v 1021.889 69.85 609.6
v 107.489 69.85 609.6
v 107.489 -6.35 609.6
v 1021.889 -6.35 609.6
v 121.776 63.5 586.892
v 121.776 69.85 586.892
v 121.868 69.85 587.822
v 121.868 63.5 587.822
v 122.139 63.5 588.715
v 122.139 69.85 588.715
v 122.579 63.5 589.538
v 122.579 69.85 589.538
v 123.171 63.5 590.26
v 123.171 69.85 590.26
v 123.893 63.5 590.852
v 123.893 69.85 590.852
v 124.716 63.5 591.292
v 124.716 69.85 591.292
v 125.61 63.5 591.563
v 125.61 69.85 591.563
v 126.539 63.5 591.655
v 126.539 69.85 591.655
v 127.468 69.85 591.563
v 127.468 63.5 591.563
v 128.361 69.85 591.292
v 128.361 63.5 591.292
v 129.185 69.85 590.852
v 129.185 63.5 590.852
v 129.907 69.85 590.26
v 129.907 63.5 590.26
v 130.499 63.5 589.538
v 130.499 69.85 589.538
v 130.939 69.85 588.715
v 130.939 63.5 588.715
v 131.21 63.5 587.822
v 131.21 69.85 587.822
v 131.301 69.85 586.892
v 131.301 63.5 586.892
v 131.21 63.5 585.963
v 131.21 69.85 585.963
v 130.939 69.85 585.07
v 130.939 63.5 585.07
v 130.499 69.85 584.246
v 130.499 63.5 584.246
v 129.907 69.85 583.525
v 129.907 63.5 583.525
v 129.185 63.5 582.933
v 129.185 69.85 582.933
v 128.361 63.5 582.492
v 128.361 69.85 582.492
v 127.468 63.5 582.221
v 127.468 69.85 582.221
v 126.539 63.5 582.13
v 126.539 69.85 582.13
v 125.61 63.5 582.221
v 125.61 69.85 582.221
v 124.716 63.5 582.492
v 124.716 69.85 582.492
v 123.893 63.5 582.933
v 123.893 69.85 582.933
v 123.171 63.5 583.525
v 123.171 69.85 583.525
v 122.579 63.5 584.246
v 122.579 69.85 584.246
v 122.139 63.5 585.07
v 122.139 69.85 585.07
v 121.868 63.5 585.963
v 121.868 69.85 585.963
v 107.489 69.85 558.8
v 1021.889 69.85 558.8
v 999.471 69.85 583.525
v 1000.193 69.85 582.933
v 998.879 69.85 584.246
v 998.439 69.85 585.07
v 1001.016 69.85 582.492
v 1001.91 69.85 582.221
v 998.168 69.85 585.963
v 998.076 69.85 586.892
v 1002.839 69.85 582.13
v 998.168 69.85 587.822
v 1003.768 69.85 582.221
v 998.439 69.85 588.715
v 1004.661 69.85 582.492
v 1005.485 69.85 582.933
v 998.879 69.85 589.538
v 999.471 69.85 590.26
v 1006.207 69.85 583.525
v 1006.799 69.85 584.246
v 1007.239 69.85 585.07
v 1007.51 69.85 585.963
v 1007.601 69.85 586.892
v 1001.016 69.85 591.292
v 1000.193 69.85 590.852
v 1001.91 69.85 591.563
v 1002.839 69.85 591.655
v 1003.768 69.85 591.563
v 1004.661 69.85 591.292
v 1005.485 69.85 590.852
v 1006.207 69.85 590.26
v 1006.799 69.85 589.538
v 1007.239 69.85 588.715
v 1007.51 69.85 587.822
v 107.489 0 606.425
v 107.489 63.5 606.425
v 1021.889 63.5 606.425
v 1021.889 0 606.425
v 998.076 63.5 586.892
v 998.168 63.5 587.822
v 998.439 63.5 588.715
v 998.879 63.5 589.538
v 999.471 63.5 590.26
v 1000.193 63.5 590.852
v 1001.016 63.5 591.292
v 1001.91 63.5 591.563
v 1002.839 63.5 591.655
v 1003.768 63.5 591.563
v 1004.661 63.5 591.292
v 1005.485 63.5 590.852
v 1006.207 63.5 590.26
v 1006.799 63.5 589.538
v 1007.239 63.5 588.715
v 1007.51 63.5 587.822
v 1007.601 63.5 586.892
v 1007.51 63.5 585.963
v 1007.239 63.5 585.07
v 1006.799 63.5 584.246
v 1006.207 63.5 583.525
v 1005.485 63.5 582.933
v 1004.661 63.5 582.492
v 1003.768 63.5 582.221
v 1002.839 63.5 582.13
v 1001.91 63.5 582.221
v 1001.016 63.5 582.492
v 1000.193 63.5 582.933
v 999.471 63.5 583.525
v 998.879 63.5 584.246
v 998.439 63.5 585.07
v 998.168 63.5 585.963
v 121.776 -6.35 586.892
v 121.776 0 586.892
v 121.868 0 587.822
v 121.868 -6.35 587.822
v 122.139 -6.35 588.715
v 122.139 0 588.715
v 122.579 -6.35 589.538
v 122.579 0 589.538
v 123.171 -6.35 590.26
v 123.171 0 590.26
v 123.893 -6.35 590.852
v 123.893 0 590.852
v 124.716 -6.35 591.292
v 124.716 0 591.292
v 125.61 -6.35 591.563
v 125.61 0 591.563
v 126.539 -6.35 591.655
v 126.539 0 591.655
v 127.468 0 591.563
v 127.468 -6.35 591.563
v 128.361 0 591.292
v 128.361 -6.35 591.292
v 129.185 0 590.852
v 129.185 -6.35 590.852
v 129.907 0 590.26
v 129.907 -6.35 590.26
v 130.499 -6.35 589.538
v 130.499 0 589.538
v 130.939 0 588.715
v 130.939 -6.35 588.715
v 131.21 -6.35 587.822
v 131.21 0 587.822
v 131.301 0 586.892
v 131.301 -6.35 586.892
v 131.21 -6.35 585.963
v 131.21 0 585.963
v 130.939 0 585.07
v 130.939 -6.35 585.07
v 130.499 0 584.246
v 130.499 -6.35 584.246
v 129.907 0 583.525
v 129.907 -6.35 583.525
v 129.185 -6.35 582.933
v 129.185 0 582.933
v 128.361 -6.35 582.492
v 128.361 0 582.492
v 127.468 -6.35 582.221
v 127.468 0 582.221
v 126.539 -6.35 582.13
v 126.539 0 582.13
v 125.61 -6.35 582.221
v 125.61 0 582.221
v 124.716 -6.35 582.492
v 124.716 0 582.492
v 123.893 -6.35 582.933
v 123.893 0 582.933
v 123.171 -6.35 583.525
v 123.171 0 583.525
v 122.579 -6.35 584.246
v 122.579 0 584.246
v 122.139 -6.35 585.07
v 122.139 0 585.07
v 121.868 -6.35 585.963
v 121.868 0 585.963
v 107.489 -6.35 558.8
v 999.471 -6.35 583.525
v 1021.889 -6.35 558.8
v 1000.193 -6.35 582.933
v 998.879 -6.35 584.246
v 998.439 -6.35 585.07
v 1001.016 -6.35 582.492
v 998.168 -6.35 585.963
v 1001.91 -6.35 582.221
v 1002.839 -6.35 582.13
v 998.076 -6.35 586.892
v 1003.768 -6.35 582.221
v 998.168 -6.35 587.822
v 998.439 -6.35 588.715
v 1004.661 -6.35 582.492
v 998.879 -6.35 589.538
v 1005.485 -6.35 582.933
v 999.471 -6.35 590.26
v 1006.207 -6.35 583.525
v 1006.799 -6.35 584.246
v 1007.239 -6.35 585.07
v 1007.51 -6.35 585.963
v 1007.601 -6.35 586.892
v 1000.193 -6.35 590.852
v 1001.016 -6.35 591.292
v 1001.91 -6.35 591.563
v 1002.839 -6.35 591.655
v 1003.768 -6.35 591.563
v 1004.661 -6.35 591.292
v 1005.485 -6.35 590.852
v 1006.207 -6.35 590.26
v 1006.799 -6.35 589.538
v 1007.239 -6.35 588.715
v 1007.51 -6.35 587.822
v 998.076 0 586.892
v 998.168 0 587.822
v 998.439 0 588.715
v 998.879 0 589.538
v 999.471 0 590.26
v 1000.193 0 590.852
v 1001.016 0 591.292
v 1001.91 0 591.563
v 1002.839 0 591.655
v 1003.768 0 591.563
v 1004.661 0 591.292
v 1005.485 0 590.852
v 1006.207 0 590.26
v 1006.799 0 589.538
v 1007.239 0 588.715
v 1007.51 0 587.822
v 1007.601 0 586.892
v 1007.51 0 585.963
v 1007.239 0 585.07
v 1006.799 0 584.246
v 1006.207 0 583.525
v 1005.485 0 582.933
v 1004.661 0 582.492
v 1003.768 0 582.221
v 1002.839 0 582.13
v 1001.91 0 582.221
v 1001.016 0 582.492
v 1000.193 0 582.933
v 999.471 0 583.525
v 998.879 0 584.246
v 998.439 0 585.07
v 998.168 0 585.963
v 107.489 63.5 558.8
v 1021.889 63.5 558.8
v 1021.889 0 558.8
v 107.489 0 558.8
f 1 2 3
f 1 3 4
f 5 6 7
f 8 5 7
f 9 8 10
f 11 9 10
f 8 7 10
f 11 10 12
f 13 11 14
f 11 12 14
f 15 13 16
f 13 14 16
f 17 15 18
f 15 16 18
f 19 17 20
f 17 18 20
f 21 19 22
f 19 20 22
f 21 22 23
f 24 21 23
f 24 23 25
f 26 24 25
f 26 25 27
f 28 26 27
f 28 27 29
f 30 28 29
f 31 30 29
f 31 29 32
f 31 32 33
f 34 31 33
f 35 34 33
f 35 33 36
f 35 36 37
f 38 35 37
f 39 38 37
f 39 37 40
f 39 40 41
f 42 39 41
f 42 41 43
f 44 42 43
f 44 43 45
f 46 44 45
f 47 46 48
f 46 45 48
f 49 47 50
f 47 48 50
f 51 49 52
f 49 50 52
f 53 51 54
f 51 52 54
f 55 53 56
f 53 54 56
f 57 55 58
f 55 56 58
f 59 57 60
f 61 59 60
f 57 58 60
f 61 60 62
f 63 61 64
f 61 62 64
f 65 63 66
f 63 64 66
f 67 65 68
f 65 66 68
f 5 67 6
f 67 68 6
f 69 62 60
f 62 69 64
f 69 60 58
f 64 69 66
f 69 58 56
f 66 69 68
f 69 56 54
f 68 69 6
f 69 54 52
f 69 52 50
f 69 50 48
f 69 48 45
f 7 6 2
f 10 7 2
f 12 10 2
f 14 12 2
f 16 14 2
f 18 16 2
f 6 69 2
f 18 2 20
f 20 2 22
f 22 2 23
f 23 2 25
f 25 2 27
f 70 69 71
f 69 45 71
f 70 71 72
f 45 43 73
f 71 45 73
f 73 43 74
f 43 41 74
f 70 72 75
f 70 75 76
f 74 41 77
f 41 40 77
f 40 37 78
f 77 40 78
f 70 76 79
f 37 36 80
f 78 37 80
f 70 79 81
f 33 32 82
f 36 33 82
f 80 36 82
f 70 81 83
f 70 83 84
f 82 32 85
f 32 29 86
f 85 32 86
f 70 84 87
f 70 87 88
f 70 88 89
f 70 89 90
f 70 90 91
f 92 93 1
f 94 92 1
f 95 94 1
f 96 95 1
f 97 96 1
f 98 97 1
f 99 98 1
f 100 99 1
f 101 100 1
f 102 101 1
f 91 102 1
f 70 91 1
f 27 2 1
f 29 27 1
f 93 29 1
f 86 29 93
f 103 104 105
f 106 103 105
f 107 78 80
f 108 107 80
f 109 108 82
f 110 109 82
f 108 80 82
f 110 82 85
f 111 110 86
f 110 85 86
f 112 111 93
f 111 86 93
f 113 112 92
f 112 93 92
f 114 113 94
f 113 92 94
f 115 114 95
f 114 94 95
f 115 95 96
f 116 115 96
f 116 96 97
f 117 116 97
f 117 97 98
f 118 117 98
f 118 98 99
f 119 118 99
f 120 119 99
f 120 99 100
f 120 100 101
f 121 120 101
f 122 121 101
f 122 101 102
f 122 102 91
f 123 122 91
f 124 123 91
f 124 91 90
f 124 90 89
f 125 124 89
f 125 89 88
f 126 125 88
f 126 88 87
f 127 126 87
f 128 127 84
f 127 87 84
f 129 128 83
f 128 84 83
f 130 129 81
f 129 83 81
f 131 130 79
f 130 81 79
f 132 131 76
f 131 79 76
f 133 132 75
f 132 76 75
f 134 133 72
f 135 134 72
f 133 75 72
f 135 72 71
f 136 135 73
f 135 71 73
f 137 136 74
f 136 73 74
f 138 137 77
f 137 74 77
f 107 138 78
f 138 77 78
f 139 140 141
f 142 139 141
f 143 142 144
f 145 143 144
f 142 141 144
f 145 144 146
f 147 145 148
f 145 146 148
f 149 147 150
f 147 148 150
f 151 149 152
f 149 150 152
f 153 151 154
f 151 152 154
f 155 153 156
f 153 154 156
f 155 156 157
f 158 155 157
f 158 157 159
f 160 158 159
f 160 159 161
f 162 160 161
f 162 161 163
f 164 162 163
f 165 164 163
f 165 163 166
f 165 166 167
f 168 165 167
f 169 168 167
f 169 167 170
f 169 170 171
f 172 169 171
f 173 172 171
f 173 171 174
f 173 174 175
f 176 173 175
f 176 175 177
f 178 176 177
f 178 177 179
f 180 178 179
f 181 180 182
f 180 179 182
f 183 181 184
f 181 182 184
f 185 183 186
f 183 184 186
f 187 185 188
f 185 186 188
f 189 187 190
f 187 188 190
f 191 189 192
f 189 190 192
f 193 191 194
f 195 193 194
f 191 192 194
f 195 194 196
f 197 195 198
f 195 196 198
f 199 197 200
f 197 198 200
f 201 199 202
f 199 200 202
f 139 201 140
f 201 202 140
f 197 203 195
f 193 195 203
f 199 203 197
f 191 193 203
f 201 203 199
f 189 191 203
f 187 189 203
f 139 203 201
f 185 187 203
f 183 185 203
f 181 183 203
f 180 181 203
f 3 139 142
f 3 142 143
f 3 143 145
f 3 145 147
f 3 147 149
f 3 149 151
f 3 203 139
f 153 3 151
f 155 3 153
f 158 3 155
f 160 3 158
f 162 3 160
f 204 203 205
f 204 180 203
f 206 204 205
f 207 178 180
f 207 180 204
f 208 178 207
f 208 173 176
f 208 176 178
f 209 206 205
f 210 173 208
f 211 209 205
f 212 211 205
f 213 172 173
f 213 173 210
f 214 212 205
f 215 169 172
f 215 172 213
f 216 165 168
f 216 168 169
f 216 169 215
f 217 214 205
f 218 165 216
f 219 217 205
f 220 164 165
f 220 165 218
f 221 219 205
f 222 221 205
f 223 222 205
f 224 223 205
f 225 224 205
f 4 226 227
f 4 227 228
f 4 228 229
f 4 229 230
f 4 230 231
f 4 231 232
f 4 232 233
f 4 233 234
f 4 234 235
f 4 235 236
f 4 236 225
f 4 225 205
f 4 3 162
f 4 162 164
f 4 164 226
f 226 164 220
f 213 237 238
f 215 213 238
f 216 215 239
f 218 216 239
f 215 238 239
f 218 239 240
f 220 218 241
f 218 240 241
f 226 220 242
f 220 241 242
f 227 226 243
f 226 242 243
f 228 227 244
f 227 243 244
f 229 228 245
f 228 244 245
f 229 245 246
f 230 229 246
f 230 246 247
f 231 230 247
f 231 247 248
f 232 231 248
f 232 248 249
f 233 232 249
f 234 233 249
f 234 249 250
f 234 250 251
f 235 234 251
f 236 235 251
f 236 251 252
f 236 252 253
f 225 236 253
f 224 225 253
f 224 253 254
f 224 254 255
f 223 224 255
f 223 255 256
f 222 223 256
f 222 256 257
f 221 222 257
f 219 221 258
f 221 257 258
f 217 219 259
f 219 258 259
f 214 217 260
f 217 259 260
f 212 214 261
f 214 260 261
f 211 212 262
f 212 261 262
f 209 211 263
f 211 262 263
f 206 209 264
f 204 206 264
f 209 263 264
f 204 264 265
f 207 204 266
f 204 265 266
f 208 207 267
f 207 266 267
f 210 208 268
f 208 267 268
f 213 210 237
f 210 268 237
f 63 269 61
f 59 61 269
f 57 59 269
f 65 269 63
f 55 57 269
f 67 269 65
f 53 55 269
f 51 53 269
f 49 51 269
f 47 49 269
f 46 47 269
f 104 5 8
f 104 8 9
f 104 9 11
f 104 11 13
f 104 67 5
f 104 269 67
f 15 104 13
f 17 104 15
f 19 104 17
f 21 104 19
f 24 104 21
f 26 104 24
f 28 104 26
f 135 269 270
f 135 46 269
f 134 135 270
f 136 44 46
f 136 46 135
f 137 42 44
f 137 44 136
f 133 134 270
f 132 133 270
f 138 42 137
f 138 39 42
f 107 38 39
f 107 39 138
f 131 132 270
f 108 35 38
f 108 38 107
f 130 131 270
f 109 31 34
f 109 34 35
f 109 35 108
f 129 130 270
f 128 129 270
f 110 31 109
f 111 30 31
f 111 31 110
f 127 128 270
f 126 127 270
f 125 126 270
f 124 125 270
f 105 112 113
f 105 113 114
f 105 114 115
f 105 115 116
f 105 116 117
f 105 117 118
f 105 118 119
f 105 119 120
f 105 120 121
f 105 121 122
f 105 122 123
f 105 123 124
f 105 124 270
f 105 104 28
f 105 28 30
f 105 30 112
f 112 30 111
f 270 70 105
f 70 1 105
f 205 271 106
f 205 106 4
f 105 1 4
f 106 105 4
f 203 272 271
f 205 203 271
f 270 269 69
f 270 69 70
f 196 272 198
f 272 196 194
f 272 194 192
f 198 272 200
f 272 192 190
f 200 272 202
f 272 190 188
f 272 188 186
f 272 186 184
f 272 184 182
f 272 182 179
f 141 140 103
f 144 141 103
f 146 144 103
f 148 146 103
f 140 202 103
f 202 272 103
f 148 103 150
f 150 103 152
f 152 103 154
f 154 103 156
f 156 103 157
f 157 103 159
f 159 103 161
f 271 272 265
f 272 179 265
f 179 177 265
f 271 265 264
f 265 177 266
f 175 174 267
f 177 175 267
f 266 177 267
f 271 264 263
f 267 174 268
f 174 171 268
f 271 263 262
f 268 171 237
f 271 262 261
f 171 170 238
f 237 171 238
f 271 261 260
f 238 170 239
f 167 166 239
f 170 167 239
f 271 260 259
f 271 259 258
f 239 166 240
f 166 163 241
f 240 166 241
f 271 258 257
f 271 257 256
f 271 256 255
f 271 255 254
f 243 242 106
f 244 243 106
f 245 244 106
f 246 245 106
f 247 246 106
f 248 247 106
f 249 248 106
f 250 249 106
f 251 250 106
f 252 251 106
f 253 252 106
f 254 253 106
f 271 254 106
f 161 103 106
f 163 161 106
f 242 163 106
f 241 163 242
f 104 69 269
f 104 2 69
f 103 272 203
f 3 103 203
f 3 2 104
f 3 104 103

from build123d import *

# Parameters (mm, degrees)
F0_W     = 914.4
F0_H     = 50.8
F1_DEPTH = 6.35
F2_W     = 914.4
F2_H     = 69.85
F3_DEPTH = 3.175
F4_W     = 914.4
F4_H     = 6.35
F5_DEPTH = 47.625
F7_D     = 9.525


with BuildPart() as f1:
    # F0 (on Front) → F1 (new body)
    with BuildSketch(Plane.XZ):
        with Locations((564.6889274399, 584.2)):
            Rectangle(F0_W, F0_H)
    extrude(amount=F1_DEPTH)

    # F2 (on face) → F3 (join)
    with BuildSketch(Plane.XY.offset(609.6)):
        with Locations((564.6889274399, 34.925)):
            Rectangle(F2_W, F2_H)
    extrude(amount=-F3_DEPTH)

    # F4 (on face) → F5 (join, through all)
    with BuildSketch(Plane(origin=(0, 0, 606.425), x_dir=(1, 0, 0), z_dir=(0, 0, -1))):
        with Locations((564.6889274399, -66.675)):
            Rectangle(F4_W, F4_H)
    extrude(amount=F5_DEPTH)

    # F7 (through all)
    with Locations(Plane.XZ.offset(6.35)):
        with Locations((126.5389274399, 586.8924), (1002.8389274399, 586.8924)):
            Hole(F7_D / 2)


solid = f1.part
